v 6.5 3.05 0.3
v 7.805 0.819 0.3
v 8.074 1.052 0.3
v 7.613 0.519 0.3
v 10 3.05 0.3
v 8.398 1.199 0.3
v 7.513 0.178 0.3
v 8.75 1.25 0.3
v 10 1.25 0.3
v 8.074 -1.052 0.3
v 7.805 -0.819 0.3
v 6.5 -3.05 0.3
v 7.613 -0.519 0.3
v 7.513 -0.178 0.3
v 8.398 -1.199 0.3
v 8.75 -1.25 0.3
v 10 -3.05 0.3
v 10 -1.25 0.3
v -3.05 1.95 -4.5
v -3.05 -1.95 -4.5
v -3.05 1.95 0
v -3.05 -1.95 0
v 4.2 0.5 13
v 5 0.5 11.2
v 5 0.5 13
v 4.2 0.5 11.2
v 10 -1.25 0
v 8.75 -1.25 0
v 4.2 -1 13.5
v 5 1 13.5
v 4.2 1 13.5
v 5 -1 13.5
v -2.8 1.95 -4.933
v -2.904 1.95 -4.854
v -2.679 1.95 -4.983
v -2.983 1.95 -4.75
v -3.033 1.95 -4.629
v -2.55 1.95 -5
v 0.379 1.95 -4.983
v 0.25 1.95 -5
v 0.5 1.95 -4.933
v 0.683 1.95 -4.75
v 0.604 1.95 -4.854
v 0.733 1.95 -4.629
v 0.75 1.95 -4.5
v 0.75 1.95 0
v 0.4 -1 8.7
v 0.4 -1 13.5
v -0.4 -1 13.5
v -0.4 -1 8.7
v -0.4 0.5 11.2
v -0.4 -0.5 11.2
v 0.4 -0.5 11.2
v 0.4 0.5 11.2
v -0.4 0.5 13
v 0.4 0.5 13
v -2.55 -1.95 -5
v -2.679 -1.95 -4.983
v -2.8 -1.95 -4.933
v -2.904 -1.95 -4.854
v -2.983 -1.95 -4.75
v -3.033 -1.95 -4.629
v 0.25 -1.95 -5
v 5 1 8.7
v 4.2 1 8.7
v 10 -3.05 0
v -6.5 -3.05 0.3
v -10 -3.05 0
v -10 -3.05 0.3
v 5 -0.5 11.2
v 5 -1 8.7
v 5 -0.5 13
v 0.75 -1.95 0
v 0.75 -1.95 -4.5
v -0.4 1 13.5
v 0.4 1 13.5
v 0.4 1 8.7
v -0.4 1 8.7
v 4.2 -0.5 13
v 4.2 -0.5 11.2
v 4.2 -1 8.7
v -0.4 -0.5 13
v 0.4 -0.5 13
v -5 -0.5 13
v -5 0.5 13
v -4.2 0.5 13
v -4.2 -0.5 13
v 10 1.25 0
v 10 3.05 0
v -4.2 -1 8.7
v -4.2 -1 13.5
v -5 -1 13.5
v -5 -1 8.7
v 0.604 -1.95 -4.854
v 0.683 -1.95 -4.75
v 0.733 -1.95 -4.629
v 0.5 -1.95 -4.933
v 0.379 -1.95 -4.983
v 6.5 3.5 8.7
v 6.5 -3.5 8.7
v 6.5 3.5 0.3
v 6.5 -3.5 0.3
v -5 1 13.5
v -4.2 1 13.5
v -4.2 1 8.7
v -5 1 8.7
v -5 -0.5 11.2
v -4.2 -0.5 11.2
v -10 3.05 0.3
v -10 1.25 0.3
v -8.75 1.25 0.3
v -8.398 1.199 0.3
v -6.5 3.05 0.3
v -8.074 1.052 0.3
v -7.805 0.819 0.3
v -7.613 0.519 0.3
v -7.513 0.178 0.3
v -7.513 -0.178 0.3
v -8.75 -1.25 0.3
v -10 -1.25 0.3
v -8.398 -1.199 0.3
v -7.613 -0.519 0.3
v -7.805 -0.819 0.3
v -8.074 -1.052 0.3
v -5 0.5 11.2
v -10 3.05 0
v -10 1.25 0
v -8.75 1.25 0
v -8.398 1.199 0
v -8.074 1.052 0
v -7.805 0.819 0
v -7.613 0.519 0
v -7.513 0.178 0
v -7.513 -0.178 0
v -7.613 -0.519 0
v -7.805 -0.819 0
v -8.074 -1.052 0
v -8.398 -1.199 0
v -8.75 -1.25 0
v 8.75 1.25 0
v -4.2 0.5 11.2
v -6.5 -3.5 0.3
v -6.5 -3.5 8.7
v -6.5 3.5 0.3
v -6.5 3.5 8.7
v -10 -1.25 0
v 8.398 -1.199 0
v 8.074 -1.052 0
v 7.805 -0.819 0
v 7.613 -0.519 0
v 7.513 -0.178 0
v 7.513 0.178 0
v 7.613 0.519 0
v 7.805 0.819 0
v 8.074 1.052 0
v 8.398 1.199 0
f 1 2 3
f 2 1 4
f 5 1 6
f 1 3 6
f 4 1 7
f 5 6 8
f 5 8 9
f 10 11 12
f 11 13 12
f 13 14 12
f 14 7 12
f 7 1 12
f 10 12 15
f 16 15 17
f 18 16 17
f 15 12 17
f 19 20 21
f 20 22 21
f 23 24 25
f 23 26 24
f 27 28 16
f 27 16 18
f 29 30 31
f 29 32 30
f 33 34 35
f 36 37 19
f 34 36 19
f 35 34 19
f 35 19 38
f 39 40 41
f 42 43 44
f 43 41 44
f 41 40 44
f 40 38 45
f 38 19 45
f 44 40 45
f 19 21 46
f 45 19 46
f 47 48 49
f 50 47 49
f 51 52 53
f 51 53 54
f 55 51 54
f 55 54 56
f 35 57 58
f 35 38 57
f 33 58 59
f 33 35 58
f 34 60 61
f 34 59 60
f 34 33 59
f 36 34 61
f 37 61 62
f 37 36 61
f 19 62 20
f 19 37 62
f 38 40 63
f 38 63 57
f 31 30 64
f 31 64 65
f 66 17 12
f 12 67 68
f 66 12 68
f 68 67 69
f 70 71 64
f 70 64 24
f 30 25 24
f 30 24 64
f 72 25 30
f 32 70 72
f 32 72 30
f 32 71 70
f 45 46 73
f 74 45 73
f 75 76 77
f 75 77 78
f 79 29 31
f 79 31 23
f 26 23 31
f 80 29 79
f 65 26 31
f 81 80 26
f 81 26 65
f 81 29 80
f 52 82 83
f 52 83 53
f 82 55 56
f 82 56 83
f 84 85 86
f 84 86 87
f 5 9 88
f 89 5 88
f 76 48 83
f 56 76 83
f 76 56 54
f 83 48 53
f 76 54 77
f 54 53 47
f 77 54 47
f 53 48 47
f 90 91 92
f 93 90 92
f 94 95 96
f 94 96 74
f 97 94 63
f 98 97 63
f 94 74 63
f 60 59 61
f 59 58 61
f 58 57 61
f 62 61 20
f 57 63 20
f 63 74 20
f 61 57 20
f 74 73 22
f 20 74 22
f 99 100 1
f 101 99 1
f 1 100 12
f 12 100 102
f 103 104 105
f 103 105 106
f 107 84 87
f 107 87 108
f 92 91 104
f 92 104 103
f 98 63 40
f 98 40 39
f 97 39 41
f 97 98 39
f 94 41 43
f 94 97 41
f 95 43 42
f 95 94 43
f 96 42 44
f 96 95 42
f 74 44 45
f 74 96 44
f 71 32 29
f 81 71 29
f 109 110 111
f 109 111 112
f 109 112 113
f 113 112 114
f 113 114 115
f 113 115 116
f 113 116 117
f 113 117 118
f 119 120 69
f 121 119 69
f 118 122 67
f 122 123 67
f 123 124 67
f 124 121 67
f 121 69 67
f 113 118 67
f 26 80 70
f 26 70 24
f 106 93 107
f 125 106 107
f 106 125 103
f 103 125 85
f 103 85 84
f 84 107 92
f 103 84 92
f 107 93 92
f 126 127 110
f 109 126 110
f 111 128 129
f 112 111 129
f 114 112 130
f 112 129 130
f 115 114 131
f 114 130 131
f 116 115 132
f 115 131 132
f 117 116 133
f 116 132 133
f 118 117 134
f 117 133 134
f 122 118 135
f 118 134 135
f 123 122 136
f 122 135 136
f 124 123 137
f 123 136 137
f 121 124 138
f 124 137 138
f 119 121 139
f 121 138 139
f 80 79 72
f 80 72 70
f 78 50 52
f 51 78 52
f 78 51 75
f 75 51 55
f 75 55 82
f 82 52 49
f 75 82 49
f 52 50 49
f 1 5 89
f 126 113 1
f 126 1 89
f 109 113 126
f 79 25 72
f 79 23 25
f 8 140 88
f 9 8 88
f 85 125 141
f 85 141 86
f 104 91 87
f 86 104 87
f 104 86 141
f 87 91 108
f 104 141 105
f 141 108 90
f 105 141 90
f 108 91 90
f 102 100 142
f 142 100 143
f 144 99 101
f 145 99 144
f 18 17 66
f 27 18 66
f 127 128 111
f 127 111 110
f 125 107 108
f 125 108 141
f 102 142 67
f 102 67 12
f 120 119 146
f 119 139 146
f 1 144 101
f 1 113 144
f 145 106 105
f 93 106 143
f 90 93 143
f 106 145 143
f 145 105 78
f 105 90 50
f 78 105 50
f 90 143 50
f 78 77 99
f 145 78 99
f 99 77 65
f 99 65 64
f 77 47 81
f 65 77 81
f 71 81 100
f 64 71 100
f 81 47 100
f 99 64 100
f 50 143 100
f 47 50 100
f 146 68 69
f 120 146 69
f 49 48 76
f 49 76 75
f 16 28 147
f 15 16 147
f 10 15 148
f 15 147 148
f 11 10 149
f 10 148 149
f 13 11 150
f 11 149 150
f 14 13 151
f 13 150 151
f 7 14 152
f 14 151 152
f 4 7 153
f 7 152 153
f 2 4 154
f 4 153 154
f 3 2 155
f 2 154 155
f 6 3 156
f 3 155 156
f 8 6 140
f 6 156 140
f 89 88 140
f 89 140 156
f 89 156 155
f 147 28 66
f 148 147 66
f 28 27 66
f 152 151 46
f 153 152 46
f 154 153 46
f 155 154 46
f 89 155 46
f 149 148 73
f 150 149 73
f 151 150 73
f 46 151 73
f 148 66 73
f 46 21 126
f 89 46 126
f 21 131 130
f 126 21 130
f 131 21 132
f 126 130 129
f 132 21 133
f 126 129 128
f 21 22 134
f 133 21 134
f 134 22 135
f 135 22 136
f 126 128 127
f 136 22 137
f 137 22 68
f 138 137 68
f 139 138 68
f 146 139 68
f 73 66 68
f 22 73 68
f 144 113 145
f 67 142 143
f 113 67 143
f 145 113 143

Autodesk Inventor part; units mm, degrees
ref_plane "YZ Plane" through (0, 0, 0) normal (1, 0, 0) x (0, 1, 0)
ref_plane "XZ Plane" through (0, 0, 0) normal (0, 1, 0) x (-1, 0, 0)
ref_plane "XY Plane" through (0, 0, 0) normal (0, 0, 1) x (1, 0, 0)
sketch "Sketch1" plane through (0, 0, 0) normal (0, 1, 0) x (-1, 0, 0)
  line L0 (10, 0.3) -> (-10, 0.3)
  line L1 (-10, 0.3) -> (-10, 0)
  line L2 (-10, 0) -> (10, 0)
  line L3 (10, 0) -> (10, 0.3)
  line L4 (-6.5, 0.3) -> (6.5, 0.3)
  line L5 (6.5, 0.3) -> (6.5, 8.7)
  line L6 (6.5, 8.7) -> (-6.5, 8.7)
  line L7 (-6.5, 8.7) -> (-6.5, 0.3)
  line L8 (6.5, 8.7) -> (5, 8.7)
  line L9 (0.4, 8.7) -> (0.4, 13.5)
  line L10 (-0.4, 13.5) -> (-0.4, 8.7)
  line L11 (-4.2, 13.5) -> (-4.2, 8.7)
  line L12 (-5, 8.7) -> (-5, 13.5)
  line L13 (4.2, 13.5) -> (4.2, 8.7)
  line L14 (5, 8.7) -> (5, 13.5)
  line L15 (4.2, 13.5) -> (5, 13.5)
  line L16 (-5, 13.5) -> (-4.2, 13.5)
  line L17 (-0.4, 13.5) -> (0.4, 13.5)
  line L18 (4.2, 8.7) -> (-6.5, 8.7)
  line L19 (5, 8.7) -> (4.2, 8.7)
  point P0 (0, 0)
  point P1 (0, 0)
  dimension "d0" = 20
  dimension "d1" = 0.3
  dimension "d2" = 13
  dimension "d6" = 8.7
  dimension "d7" = 13.5
extrude "Extrusion1" add sketch "Sketch1" along normal mid plane 7 contours L0 L7 L6 L5
extrude "Extrusion2" add sketch "Sketch1" along normal mid plane 6.1 contours L3 L2 L1 L0
extrude "Extrusion3" add sketch "Sketch1" along normal mid plane 2 contours L6 L13 L15 L14 | L12 L16 L11 L6 | L6 L10 L17 L9
sketch "Sketch2" plane through (10, 3.05, 0) normal (0, 0, -1) x (-1, 0, 0)
  line L0 (0, -6.1) -> (0, 0) projected
  line L1 (20, -6.1) -> (20, 0) projected
  line L2 (20, -6.1) -> (0, -6.1) projected
  line L3 (0, 0) -> (20, 0) projected
  arc A0 (18.75, -1.8) -> (18.75, -4.3) centre (18.75, -3.05) ccw
  line L4 (18.75, -4.3) -> (20, -4.3)
  line L5 (18.75, -1.8) -> (20, -1.8)
  arc A1 (1.25, -4.3) -> (1.25, -1.8) centre (1.25, -3.05) ccw
  line L6 (1.25, -4.3) -> (0, -4.3)
  line L7 (1.25, -1.8) -> (0, -1.8)
  line L8 (13.05, -1.1) -> (6.95, -1.1)
  line L9 (6.95, -1.1) -> (6.95, -5)
  line L10 (6.95, -5) -> (13.05, -5)
  line L11 (13.05, -5) -> (13.05, -1.1)
  line L12 (13.05, -1.1) -> (9.25, -1.1)
  line L13 (9.25, -1.1) -> (9.25, -5)
  line L14 (9.25, -5) -> (13.05, -5)
  line L15 (13.05, -5) -> (13.05, -1.1)
  line L16 (0, -1.8) -> (0, -4.3)
  line L17 (20, -1.8) -> (20, -4.3)
  line L18 (3.5, 0.45) -> (16.5, 0.45) projected
  line L19 (16.5, -6.55) -> (3.5, -6.55) projected
  point P0 (10, -3.05)
  dimension "d16" = 6.1
  dimension "d17" = 2.5
  dimension "d18" = 17.5
  dimension "d22" = 3.9
  dimension "d23" = 6.1
  dimension "d24" = 3.8
  dimension "d34" = 7
extrude "Extrusion4" cut sketch "Sketch2" against normal blind 0.3 contours L0 L7 A1 L6 | L4 A0 L5 L1
extrude "Extrusion5" add sketch "Sketch2" along normal blind 5 contours L11 L10 L13 L8
fillet "Fillet1" radius 0.5 2 edges at (0.75, 0, -5) (-3.05, 0, -5)
sketch "Sketch3" plane through (-5, -1, 13.5) normal (-1, 0, 0) x (0, 0, 1)
  line L0 (-0.5, 0.5) -> (-2.3, 0.5)
  line L1 (-2.3, 0.5) -> (-2.3, 1.5)
  line L2 (-2.3, 1.5) -> (-0.5, 1.5)
  line L3 (-0.5, 1.5) -> (-0.5, 0.5)
  point P0 (-13.5, 1)
  dimension "d30" = 1.8
  dimension "d31" = 1
extrude "Extrusion6" cut sketch "Sketch3" against normal blind 13
properties part number "Power_Switch"
